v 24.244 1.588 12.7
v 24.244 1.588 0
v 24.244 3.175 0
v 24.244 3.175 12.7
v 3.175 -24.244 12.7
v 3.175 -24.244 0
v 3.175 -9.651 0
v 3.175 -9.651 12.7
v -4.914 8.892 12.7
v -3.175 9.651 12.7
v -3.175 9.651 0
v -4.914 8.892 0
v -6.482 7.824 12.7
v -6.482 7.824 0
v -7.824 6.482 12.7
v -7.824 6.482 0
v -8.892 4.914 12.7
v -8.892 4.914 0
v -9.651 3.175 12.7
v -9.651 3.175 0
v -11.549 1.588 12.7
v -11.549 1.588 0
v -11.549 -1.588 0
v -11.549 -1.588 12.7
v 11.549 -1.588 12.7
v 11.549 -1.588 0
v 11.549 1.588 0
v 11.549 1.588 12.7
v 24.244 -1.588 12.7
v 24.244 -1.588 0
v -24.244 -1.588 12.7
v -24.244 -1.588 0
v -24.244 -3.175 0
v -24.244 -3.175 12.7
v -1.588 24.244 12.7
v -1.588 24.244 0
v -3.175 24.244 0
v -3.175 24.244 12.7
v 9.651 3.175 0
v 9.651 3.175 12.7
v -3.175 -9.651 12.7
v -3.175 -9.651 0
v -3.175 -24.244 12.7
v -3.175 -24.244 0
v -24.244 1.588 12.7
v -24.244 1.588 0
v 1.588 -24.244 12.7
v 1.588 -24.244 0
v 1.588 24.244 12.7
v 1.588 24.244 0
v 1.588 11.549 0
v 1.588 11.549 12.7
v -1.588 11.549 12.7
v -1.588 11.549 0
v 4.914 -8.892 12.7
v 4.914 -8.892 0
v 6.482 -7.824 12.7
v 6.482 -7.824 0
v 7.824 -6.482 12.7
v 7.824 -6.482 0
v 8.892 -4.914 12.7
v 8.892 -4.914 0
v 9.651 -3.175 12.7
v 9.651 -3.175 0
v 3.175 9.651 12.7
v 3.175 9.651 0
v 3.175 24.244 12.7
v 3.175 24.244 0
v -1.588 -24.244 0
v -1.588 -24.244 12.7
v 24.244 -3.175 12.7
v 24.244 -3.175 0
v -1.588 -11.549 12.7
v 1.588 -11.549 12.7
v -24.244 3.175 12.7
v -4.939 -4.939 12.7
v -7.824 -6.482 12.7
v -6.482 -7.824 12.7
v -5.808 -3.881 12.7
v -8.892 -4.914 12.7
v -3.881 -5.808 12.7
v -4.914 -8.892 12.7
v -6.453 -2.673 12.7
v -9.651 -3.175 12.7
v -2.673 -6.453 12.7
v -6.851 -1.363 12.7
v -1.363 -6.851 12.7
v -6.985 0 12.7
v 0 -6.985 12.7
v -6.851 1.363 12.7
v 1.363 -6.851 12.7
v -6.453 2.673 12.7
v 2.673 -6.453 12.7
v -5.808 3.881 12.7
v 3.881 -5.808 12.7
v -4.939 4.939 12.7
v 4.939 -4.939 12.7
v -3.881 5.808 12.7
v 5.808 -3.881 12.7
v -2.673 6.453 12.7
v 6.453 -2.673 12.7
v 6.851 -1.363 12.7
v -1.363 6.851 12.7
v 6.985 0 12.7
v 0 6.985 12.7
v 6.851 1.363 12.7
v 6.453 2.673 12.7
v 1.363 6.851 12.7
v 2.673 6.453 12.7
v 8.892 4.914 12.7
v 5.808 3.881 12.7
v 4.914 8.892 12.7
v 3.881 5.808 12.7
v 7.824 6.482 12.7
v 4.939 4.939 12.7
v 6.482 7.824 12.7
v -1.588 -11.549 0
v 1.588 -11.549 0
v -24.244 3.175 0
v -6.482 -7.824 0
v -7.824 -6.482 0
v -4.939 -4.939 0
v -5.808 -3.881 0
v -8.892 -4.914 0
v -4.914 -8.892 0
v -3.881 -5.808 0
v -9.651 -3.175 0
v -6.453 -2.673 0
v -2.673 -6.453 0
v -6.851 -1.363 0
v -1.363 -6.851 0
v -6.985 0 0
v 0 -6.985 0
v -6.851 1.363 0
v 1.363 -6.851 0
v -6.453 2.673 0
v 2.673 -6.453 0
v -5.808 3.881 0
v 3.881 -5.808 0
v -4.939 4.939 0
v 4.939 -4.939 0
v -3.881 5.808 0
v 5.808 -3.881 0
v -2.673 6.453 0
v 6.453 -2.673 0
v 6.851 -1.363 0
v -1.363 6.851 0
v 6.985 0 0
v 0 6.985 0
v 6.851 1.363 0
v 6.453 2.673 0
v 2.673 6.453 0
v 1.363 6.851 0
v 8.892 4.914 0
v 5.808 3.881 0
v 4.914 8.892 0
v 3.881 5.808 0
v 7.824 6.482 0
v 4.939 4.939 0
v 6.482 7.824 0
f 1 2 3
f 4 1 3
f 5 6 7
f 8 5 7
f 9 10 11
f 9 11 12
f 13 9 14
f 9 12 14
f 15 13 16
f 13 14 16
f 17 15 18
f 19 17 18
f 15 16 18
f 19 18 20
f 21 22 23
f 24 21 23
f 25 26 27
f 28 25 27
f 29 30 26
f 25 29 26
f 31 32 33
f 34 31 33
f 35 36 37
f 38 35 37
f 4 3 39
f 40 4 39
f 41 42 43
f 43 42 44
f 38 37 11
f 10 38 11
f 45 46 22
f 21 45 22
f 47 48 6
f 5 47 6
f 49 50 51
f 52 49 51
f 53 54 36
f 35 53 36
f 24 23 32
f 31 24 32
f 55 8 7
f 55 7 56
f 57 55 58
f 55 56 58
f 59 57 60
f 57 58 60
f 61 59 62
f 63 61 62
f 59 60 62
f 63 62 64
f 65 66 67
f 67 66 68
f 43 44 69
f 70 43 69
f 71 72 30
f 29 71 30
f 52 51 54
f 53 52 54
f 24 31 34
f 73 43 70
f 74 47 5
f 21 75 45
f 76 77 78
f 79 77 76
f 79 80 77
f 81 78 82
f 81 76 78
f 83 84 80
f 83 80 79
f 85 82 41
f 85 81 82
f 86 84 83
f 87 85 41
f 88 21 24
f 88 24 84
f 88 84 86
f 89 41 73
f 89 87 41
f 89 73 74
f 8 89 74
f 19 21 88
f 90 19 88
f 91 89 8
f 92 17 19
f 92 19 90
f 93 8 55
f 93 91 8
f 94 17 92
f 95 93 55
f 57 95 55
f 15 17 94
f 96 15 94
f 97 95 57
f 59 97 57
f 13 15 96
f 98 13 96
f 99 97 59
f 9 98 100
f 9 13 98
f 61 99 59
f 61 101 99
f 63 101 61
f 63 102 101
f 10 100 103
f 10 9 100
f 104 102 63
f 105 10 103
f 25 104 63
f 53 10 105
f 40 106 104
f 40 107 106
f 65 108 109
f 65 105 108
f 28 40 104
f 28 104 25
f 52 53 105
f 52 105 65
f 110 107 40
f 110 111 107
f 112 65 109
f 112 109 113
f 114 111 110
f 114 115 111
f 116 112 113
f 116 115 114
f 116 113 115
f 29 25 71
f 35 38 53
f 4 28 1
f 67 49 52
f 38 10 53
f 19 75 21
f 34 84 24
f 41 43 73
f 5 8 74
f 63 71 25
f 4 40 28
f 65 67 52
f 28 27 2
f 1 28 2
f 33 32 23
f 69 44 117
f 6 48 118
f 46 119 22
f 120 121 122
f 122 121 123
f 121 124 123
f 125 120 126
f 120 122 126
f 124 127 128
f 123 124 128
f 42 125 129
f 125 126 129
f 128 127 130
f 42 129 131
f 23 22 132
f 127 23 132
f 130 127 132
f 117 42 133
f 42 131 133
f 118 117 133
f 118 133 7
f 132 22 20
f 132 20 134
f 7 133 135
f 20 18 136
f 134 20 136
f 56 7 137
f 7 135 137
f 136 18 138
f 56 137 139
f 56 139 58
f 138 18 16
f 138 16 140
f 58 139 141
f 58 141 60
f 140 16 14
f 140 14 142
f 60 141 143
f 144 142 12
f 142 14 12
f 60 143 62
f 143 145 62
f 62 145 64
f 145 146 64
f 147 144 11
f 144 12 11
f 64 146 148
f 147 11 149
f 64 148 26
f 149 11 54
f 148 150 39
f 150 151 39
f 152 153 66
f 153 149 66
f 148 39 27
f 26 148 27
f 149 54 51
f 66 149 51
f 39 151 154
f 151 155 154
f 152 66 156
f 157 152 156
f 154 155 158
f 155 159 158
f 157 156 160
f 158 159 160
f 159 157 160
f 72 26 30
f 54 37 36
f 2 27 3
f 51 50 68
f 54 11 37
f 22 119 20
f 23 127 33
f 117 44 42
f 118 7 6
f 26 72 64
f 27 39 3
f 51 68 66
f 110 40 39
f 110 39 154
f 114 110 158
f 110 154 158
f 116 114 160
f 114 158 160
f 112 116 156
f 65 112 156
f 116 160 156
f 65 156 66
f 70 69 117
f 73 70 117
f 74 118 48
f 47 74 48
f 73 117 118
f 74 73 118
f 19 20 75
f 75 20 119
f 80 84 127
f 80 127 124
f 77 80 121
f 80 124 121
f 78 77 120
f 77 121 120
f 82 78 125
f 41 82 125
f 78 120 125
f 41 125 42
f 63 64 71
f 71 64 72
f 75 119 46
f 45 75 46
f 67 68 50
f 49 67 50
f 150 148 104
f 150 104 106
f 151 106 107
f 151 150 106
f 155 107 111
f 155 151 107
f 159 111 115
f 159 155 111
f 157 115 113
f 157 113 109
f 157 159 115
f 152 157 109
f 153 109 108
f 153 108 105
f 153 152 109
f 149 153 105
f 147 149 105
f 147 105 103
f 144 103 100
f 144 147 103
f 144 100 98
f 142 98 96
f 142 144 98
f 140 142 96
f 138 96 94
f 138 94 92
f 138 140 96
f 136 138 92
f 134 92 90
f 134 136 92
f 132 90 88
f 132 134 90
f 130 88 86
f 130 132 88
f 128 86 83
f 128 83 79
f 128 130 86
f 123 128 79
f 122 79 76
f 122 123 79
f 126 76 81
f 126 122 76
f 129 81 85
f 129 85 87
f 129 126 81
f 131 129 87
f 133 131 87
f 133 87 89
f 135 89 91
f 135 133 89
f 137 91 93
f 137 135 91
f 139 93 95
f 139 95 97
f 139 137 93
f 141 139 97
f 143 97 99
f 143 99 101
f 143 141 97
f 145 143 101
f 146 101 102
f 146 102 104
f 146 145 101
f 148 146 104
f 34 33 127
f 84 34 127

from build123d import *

# Parameters (mm, degrees)
F0_R     = 6.985
F1_DEPTH = 12.7


with BuildPart() as f1:
    # F0 (on Top) → F1 (new body)
    with BuildSketch(Plane.XY):
        with BuildLine():
            ThreePointArc((-3.175, 9.651164), (0, 10.16), (3.175, 9.651164))
            Line((3.175, 9.651164), (3.175, 24.243791))
            Line((3.175, 24.243791), (1.5875, 24.243791))
            Line((1.5875, 24.243791), (1.5875, 11.548717))
            Line((1.5875, 11.548717), (-1.5875, 11.548717))
            Line((-1.5875, 11.548717), (-1.5875, 24.243791))
            Line((-1.5875, 24.243791), (-3.175, 24.243791))
            Line((-3.175, 24.243791), (-3.175, 9.651164))
        make_face()
        with BuildLine():
            Line((3.175, 7.733791), (3.175, 9.651164))
            ThreePointArc((3.175, 9.651164), (0, 10.16), (-3.175, 9.651164))
            Line((-3.175, 9.651164), (-3.175, 7.733791))
            Line((-3.175, 7.733791), (3.175, 7.733791))
        make_face()
        with BuildLine():
            Line((7.733791, 3.175), (9.651164, 3.175))
            ThreePointArc((9.651164, 3.175), (7.184205, 7.184205), (3.175, 9.651164))
            Line((3.175, 9.651164), (3.175, 7.733791))
            Line((3.175, 7.733791), (-3.175, 7.733791))
            Line((-3.175, 7.733791), (-3.175, 9.651164))
            ThreePointArc((-3.175, 9.651164), (-7.184205, 7.184205), (-9.651164, 3.175))
            Line((-9.651164, 3.175), (-7.733791, 3.175))
            Line((-7.733791, 3.175), (-7.733791, -3.175))
            Line((-7.733791, -3.175), (-9.651164, -3.175))
            ThreePointArc((-9.651164, -3.175), (-7.184205, -7.184205), (-3.175, -9.651164))
            Line((-3.175, -9.651164), (-3.175, -7.733791))
            Line((-3.175, -7.733791), (3.175, -7.733791))
            Line((3.175, -7.733791), (3.175, -9.651164))
            ThreePointArc((3.175, -9.651164), (7.184205, -7.184205), (9.651164, -3.175))
            Line((9.651164, -3.175), (7.733791, -3.175))
            Line((7.733791, -3.175), (7.733791, 3.175))
        make_face()
        Circle(F0_R, mode=Mode.SUBTRACT)
        with BuildLine():
            ThreePointArc((9.651164, -3.175), (10.031985, -1.607758), (10.16, 0))
            ThreePointArc((10.16, 0), (10.031985, 1.607758), (9.651164, 3.175))
            Line((9.651164, 3.175), (7.733791, 3.175))
            Line((7.733791, 3.175), (7.733791, -3.175))
            Line((7.733791, -3.175), (9.651164, -3.175))
        make_face()
        with BuildLine():
            ThreePointArc((9.651164, 3.175), (10.031985, 1.607758), (10.16, 0))
            ThreePointArc((10.16, 0), (10.031985, -1.607758), (9.651164, -3.175))
            Line((9.651164, -3.175), (24.243791, -3.175))
            Line((24.243791, -3.175), (24.243791, -1.5875))
            Line((24.243791, -1.5875), (11.548717, -1.5875))
            Line((11.548717, -1.5875), (11.548717, 1.5875))
            Line((11.548717, 1.5875), (24.243791, 1.5875))
            Line((24.243791, 1.5875), (24.243791, 3.175))
            Line((24.243791, 3.175), (9.651164, 3.175))
        make_face()
        with BuildLine():
            Line((3.175, -24.243791), (3.175, -9.651164))
            ThreePointArc((3.175, -9.651164), (0, -10.16), (-3.175, -9.651164))
            Line((-3.175, -9.651164), (-3.175, -24.243791))
            Line((-3.175, -24.243791), (-1.5875, -24.243791))
            Line((-1.5875, -24.243791), (-1.5875, -11.548717))
            Line((-1.5875, -11.548717), (1.5875, -11.548717))
            Line((1.5875, -11.548717), (1.5875, -24.243791))
            Line((1.5875, -24.243791), (3.175, -24.243791))
        make_face()
        with BuildLine():
            ThreePointArc((-3.175, -9.651164), (0, -10.16), (3.175, -9.651164))
            Line((3.175, -9.651164), (3.175, -7.733791))
            Line((3.175, -7.733791), (-3.175, -7.733791))
            Line((-3.175, -7.733791), (-3.175, -9.651164))
        make_face()
        with BuildLine():
            Line((-7.733791, 3.175), (-9.651164, 3.175))
            ThreePointArc((-9.651164, 3.175), (-10.16, 0), (-9.651164, -3.175))
            Line((-9.651164, -3.175), (-7.733791, -3.175))
            Line((-7.733791, -3.175), (-7.733791, 3.175))
        make_face()
        with BuildLine():
            ThreePointArc((-9.651164, -3.175), (-10.16, 0), (-9.651164, 3.175))
            Line((-9.651164, 3.175), (-24.243791, 3.175))
            Line((-24.243791, 3.175), (-24.243791, 1.5875))
            Line((-24.243791, 1.5875), (-11.548717, 1.5875))
            Line((-11.548717, 1.5875), (-11.548717, -1.5875))
            Line((-11.548717, -1.5875), (-24.243791, -1.5875))
            Line((-24.243791, -1.5875), (-24.243791, -3.175))
            Line((-24.243791, -3.175), (-9.651164, -3.175))
        make_face()
    extrude(amount=F1_DEPTH)


solid = f1.part
